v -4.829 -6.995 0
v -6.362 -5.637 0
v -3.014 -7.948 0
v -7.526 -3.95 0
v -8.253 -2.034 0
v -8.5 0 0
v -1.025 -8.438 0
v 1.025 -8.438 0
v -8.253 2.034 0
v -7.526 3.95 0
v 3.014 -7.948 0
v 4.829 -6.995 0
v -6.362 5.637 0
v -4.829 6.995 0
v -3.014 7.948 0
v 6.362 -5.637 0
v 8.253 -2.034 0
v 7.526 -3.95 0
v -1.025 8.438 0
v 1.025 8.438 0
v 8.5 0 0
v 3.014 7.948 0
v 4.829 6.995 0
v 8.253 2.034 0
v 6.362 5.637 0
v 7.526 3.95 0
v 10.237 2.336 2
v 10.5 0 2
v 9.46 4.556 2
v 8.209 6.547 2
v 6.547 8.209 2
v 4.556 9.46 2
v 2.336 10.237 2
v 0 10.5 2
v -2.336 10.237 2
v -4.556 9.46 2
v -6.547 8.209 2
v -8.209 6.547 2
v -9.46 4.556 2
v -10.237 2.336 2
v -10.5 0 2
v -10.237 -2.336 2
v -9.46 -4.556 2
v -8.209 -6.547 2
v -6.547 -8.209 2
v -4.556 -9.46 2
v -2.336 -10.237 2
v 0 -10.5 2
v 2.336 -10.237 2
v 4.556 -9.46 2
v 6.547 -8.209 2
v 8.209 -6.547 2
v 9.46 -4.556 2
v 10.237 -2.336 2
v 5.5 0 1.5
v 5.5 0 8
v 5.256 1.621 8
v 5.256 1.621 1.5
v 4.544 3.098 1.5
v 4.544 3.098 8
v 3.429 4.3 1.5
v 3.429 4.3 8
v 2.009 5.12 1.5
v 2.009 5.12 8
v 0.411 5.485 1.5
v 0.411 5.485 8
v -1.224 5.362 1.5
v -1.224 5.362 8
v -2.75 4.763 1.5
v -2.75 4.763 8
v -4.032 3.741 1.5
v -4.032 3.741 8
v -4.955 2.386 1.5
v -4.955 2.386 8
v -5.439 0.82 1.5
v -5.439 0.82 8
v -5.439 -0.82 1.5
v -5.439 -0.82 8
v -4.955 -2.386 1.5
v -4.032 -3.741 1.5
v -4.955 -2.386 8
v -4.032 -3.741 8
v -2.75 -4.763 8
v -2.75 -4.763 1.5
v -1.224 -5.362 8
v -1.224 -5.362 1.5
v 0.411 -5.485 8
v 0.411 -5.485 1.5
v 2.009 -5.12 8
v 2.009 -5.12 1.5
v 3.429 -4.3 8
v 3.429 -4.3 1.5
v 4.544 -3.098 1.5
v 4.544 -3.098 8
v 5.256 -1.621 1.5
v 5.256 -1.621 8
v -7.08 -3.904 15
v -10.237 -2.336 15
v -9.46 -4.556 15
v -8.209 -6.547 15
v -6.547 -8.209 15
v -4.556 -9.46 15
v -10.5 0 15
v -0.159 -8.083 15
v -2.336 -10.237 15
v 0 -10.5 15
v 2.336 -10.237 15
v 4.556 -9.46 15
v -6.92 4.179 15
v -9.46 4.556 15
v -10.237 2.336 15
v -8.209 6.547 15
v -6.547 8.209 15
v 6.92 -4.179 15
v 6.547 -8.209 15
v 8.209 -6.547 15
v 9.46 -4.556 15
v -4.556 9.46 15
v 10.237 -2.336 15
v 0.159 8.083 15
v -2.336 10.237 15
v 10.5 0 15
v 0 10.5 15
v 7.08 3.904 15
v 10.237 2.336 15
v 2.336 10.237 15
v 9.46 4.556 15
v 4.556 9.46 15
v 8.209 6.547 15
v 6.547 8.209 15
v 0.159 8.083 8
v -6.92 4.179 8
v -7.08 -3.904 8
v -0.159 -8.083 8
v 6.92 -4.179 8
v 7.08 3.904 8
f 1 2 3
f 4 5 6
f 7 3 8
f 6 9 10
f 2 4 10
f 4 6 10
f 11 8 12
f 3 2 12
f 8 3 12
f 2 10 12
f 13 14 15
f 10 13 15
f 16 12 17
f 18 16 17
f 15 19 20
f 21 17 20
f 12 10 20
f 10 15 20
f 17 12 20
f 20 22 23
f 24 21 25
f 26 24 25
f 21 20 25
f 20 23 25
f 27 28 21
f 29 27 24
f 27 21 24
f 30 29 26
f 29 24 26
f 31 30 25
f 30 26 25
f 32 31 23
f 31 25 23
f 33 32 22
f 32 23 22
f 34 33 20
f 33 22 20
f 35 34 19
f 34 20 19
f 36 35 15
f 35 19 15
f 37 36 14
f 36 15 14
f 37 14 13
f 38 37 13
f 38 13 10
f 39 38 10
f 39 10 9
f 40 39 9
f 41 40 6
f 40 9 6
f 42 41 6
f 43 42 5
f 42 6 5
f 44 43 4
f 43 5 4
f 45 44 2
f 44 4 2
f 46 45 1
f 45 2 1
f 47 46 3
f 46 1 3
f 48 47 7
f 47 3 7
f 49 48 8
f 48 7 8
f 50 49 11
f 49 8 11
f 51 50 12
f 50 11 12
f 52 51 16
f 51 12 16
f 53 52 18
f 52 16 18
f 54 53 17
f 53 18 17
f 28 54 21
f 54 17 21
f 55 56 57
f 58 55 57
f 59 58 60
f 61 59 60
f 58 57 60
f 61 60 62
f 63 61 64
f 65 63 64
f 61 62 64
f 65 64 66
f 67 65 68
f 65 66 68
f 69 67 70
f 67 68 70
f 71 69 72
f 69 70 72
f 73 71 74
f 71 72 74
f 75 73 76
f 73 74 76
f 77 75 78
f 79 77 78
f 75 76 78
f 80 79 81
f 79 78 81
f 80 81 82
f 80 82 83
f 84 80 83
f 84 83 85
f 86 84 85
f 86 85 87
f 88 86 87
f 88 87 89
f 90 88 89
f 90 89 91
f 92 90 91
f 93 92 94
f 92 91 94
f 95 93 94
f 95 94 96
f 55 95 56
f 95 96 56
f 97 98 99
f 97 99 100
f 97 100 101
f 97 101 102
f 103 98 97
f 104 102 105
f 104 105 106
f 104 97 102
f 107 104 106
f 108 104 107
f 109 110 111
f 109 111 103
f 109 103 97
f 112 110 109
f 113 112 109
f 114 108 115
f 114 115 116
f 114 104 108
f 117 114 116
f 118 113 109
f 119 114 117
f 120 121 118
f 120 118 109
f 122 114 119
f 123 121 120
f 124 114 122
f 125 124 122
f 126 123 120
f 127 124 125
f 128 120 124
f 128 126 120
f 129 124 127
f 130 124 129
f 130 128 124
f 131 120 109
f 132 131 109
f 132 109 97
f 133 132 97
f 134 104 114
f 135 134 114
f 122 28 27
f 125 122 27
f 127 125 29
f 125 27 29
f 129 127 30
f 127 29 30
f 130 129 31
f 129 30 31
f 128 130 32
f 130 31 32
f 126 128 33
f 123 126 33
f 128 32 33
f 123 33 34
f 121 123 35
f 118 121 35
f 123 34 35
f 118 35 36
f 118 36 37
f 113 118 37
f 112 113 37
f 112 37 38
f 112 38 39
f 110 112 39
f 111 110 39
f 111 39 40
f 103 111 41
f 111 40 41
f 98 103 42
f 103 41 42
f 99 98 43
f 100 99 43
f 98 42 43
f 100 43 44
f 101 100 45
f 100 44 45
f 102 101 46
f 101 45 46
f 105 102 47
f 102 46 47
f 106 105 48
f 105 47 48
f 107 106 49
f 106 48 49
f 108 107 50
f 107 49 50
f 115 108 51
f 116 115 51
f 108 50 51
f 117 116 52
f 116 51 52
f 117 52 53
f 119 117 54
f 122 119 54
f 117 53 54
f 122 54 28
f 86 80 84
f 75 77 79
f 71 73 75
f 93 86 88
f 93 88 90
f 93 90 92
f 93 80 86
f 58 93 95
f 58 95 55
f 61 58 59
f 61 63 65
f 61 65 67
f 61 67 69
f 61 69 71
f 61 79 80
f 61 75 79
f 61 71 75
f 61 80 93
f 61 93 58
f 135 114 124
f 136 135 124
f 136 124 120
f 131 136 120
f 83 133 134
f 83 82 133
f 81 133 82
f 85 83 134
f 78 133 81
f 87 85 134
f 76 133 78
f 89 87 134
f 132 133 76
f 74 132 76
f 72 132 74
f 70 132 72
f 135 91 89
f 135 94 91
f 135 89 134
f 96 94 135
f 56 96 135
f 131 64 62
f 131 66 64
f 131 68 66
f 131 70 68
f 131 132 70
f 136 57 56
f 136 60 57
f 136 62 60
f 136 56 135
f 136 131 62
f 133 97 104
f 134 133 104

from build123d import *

# Parameters (mm, degrees)
SKETCH_R        = 10.5
PAD_DEPTH       = 15
POCKET_DEPTH    = 7
SKETCH002_R     = 5.5
POCKET001_DEPTH = 6.5
CHAMFER_SIZE    = 2


with BuildPart() as part:
    # Sketch → Pad (new body)
    with BuildSketch(Plane.XY):
        Circle(SKETCH_R)
    extrude(amount=PAD_DEPTH)

    # Sketch001 (on Face3 of Pad) → Pocket (cut)
    with BuildSketch(Plane.XY.offset(15)):
        Polygon((6.920429, -4.179273), (7.079571, 3.903631), (0.159142, 8.082904), (-6.920429, 4.179273), (-7.079571, -3.903631), (-0.159142, -8.082904), align=None)
    extrude(amount=-POCKET_DEPTH, mode=Mode.SUBTRACT)

    # Sketch002 (on Face10 of Pocket) → Pocket001 (cut)
    with BuildSketch(Plane.XY.offset(8)):
        Circle(SKETCH002_R)
    extrude(amount=-POCKET001_DEPTH, mode=Mode.SUBTRACT)

    # Chamfer
    chamfer_edges = [part.edges().sort_by_distance(p)[0] for p in [
        (-10.5, 0, 0),
    ]]
    chamfer(chamfer_edges, length=CHAMFER_SIZE)


solid = part.part
